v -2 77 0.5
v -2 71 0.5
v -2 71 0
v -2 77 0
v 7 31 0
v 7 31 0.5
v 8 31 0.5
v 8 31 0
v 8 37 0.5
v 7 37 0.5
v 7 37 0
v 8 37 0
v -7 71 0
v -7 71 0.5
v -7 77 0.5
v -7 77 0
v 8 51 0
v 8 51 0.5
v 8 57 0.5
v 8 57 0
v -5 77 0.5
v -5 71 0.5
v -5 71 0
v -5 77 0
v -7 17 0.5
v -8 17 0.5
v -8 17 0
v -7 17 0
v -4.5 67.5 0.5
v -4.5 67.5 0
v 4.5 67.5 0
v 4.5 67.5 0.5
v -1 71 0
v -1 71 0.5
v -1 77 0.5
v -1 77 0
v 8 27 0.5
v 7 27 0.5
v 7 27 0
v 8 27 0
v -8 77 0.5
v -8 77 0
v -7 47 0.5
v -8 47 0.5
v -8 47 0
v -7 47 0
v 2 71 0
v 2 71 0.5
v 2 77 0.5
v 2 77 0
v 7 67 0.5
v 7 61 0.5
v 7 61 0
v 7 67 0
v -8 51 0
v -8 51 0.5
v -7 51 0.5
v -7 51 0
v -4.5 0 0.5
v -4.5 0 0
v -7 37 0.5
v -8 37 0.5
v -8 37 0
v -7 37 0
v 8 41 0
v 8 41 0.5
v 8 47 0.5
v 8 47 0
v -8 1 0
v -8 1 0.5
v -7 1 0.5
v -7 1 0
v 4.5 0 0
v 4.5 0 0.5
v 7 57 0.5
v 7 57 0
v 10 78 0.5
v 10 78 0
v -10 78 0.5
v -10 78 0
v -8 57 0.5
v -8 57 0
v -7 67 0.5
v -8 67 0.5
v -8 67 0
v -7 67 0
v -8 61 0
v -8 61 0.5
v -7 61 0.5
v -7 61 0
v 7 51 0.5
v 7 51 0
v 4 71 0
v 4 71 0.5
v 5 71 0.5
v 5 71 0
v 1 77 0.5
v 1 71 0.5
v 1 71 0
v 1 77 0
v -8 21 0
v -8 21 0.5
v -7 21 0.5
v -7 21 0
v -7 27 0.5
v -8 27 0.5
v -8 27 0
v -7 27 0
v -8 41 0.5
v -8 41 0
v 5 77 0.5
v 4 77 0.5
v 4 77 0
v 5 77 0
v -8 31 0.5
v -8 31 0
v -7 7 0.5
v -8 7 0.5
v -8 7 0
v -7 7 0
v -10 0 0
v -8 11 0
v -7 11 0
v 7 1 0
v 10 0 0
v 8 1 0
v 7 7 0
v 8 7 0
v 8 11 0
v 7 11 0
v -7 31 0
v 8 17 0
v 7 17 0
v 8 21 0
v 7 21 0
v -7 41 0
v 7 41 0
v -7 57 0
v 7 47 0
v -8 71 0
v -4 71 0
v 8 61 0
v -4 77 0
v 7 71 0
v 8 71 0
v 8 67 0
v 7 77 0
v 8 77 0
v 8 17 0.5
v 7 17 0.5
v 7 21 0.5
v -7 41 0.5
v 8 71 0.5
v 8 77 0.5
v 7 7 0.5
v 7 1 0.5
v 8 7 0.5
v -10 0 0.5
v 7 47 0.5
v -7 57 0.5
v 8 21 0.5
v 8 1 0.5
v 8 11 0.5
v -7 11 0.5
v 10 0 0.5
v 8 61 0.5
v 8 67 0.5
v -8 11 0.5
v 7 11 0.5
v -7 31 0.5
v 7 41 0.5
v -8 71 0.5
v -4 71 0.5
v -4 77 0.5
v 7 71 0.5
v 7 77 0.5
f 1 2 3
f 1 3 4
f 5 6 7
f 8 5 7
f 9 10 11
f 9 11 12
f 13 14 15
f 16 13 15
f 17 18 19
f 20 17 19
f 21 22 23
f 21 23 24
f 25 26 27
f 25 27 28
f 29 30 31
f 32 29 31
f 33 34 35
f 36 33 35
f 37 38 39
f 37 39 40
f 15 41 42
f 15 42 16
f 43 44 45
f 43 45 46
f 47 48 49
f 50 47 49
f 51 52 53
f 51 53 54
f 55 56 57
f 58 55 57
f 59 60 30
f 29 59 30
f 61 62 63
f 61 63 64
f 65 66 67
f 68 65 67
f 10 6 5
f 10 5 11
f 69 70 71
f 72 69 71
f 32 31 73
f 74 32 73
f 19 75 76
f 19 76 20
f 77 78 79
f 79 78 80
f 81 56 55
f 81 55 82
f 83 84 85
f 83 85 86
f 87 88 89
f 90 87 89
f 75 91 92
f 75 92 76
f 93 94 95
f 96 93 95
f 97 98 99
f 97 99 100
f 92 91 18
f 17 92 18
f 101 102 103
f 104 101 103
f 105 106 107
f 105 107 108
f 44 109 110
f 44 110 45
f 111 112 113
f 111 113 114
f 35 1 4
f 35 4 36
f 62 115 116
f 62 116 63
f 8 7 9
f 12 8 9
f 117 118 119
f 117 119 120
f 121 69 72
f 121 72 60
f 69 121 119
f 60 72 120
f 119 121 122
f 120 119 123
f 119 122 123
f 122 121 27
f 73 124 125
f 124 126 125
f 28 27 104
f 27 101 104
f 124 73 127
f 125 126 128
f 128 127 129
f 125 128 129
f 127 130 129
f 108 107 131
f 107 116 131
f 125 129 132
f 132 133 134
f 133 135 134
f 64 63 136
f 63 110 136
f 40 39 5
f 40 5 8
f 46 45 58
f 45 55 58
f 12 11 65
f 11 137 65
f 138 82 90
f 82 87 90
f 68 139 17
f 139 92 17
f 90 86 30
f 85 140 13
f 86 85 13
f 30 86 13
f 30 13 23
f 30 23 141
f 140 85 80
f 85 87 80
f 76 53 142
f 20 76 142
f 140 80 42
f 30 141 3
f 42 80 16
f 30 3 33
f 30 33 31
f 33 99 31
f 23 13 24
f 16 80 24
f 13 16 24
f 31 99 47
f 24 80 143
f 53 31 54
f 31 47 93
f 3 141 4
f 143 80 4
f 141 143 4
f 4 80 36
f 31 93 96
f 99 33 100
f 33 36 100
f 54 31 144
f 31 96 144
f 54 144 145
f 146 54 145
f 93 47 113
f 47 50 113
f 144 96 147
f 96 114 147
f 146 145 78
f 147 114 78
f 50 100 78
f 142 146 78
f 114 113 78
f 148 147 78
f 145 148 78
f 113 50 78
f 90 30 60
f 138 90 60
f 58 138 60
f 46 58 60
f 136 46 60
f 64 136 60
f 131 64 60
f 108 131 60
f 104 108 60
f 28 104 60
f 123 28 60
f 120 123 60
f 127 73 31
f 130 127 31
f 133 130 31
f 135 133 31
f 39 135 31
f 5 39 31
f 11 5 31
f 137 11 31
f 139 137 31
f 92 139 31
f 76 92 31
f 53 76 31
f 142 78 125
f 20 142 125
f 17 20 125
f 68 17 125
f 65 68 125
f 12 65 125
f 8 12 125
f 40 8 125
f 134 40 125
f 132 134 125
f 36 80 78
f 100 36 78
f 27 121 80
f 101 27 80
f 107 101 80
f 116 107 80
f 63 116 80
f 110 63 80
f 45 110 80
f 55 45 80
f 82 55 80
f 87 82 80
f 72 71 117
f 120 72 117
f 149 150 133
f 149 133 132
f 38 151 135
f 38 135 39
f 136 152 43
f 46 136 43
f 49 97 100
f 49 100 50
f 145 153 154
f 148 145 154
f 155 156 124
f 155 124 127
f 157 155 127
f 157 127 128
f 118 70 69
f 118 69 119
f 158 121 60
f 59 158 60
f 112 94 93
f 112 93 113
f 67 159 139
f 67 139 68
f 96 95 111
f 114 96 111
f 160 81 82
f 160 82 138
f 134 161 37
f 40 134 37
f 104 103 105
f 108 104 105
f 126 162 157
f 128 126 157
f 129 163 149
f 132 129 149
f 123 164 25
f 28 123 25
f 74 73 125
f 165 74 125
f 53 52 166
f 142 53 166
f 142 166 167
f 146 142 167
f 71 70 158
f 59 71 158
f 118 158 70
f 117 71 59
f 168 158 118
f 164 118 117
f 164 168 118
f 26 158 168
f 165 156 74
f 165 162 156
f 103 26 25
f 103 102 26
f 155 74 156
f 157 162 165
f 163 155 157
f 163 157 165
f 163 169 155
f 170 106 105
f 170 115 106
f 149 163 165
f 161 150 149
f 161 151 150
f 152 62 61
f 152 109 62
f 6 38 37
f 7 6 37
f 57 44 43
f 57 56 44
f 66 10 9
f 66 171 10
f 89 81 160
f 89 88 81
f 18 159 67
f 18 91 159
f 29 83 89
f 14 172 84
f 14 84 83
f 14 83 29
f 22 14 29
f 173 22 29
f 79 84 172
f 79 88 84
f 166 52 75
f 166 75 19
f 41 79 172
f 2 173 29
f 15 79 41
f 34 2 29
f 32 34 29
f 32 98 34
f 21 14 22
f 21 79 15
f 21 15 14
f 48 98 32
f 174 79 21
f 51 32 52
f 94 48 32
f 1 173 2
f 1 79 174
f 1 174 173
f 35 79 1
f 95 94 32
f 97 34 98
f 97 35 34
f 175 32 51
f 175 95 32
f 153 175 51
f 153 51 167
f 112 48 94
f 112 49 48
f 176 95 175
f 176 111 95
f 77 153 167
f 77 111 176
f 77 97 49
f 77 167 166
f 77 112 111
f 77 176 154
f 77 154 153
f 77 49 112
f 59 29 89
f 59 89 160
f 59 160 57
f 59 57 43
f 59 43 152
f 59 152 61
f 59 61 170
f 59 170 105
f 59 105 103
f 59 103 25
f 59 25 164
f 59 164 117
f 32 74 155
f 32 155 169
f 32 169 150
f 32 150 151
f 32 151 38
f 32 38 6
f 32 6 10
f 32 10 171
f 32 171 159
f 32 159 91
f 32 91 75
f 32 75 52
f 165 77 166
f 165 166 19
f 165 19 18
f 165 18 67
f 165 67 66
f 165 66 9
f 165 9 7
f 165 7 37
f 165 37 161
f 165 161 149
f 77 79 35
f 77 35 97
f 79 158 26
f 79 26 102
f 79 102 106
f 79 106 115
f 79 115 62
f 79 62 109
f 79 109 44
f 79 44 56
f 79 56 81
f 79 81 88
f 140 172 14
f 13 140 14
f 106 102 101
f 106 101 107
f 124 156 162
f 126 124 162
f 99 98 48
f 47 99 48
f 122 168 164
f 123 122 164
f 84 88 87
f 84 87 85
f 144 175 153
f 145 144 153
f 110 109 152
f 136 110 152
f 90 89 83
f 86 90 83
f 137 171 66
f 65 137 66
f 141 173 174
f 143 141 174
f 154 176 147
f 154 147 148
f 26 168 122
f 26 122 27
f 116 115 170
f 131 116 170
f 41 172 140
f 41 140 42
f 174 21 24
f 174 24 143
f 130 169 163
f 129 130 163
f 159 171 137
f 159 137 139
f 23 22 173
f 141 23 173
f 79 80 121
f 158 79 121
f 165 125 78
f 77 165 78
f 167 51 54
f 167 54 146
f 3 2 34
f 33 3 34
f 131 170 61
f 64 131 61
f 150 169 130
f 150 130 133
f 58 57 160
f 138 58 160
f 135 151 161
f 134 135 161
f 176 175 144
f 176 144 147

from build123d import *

# Parameters (mm, degrees)
EXTRUDE_1_DEPTH     = 0.5
SKETCH_3_W          = 1
SKETCH_3_H          = 6
CUT_EXTRUDE_1_DEPTH = 0.5


with BuildPart() as part:
    # 草图1 → 凸台-拉伸1 (new body)
    with BuildSketch(Plane.XY):
        Polygon((-4.5, 0), (-4.5, 67.5), (4.5, 67.5), (4.5, 0), (10, 0), (10, 78), (-10, 78), (-10, 0), align=None)
    extrude(amount=EXTRUDE_1_DEPTH)

    # 草图3 → 切除-拉伸1 (cut)
    with BuildSketch(Plane.XY.offset(0.5)):
        with Locations((-7.5, 74)):
            Rectangle(SKETCH_3_W, SKETCH_3_H)
        with Locations((-4.5, 74)):
            Rectangle(SKETCH_3_W, SKETCH_3_H)
        with Locations((-1.5, 74)):
            Rectangle(SKETCH_3_W, SKETCH_3_H)
        with Locations((1.5, 74)):
            Rectangle(SKETCH_3_W, SKETCH_3_H)
        with Locations((4.5, 74)):
            Rectangle(SKETCH_3_W, SKETCH_3_H)
        with Locations((7.5, 74)):
            Rectangle(SKETCH_3_W, SKETCH_3_H)
        with Locations((-7.5, 64)):
            Rectangle(SKETCH_3_W, SKETCH_3_H)
        with Locations((7.5, 64)):
            Rectangle(SKETCH_3_W, SKETCH_3_H)
        with Locations((-7.5, 54)):
            Rectangle(SKETCH_3_W, SKETCH_3_H)
        with Locations((7.5, 54)):
            Rectangle(SKETCH_3_W, SKETCH_3_H)
        with Locations((-7.5, 44)):
            Rectangle(SKETCH_3_W, SKETCH_3_H)
        with Locations((7.5, 44)):
            Rectangle(SKETCH_3_W, SKETCH_3_H)
        with Locations((-7.5, 34)):
            Rectangle(SKETCH_3_W, SKETCH_3_H)
        with Locations((7.5, 34)):
            Rectangle(SKETCH_3_W, SKETCH_3_H)
        with Locations((-7.5, 24)):
            Rectangle(SKETCH_3_W, SKETCH_3_H)
        with Locations((7.5, 24)):
            Rectangle(SKETCH_3_W, SKETCH_3_H)
        with Locations((-7.5, 14)):
            Rectangle(SKETCH_3_W, SKETCH_3_H)
        with Locations((7.5, 14)):
            Rectangle(SKETCH_3_W, SKETCH_3_H)
        with Locations((-7.5, 4)):
            Rectangle(SKETCH_3_W, SKETCH_3_H)
        with Locations((7.5, 4)):
            Rectangle(SKETCH_3_W, SKETCH_3_H)
    extrude(amount=-CUT_EXTRUDE_1_DEPTH, mode=Mode.SUBTRACT)


solid = part.part
